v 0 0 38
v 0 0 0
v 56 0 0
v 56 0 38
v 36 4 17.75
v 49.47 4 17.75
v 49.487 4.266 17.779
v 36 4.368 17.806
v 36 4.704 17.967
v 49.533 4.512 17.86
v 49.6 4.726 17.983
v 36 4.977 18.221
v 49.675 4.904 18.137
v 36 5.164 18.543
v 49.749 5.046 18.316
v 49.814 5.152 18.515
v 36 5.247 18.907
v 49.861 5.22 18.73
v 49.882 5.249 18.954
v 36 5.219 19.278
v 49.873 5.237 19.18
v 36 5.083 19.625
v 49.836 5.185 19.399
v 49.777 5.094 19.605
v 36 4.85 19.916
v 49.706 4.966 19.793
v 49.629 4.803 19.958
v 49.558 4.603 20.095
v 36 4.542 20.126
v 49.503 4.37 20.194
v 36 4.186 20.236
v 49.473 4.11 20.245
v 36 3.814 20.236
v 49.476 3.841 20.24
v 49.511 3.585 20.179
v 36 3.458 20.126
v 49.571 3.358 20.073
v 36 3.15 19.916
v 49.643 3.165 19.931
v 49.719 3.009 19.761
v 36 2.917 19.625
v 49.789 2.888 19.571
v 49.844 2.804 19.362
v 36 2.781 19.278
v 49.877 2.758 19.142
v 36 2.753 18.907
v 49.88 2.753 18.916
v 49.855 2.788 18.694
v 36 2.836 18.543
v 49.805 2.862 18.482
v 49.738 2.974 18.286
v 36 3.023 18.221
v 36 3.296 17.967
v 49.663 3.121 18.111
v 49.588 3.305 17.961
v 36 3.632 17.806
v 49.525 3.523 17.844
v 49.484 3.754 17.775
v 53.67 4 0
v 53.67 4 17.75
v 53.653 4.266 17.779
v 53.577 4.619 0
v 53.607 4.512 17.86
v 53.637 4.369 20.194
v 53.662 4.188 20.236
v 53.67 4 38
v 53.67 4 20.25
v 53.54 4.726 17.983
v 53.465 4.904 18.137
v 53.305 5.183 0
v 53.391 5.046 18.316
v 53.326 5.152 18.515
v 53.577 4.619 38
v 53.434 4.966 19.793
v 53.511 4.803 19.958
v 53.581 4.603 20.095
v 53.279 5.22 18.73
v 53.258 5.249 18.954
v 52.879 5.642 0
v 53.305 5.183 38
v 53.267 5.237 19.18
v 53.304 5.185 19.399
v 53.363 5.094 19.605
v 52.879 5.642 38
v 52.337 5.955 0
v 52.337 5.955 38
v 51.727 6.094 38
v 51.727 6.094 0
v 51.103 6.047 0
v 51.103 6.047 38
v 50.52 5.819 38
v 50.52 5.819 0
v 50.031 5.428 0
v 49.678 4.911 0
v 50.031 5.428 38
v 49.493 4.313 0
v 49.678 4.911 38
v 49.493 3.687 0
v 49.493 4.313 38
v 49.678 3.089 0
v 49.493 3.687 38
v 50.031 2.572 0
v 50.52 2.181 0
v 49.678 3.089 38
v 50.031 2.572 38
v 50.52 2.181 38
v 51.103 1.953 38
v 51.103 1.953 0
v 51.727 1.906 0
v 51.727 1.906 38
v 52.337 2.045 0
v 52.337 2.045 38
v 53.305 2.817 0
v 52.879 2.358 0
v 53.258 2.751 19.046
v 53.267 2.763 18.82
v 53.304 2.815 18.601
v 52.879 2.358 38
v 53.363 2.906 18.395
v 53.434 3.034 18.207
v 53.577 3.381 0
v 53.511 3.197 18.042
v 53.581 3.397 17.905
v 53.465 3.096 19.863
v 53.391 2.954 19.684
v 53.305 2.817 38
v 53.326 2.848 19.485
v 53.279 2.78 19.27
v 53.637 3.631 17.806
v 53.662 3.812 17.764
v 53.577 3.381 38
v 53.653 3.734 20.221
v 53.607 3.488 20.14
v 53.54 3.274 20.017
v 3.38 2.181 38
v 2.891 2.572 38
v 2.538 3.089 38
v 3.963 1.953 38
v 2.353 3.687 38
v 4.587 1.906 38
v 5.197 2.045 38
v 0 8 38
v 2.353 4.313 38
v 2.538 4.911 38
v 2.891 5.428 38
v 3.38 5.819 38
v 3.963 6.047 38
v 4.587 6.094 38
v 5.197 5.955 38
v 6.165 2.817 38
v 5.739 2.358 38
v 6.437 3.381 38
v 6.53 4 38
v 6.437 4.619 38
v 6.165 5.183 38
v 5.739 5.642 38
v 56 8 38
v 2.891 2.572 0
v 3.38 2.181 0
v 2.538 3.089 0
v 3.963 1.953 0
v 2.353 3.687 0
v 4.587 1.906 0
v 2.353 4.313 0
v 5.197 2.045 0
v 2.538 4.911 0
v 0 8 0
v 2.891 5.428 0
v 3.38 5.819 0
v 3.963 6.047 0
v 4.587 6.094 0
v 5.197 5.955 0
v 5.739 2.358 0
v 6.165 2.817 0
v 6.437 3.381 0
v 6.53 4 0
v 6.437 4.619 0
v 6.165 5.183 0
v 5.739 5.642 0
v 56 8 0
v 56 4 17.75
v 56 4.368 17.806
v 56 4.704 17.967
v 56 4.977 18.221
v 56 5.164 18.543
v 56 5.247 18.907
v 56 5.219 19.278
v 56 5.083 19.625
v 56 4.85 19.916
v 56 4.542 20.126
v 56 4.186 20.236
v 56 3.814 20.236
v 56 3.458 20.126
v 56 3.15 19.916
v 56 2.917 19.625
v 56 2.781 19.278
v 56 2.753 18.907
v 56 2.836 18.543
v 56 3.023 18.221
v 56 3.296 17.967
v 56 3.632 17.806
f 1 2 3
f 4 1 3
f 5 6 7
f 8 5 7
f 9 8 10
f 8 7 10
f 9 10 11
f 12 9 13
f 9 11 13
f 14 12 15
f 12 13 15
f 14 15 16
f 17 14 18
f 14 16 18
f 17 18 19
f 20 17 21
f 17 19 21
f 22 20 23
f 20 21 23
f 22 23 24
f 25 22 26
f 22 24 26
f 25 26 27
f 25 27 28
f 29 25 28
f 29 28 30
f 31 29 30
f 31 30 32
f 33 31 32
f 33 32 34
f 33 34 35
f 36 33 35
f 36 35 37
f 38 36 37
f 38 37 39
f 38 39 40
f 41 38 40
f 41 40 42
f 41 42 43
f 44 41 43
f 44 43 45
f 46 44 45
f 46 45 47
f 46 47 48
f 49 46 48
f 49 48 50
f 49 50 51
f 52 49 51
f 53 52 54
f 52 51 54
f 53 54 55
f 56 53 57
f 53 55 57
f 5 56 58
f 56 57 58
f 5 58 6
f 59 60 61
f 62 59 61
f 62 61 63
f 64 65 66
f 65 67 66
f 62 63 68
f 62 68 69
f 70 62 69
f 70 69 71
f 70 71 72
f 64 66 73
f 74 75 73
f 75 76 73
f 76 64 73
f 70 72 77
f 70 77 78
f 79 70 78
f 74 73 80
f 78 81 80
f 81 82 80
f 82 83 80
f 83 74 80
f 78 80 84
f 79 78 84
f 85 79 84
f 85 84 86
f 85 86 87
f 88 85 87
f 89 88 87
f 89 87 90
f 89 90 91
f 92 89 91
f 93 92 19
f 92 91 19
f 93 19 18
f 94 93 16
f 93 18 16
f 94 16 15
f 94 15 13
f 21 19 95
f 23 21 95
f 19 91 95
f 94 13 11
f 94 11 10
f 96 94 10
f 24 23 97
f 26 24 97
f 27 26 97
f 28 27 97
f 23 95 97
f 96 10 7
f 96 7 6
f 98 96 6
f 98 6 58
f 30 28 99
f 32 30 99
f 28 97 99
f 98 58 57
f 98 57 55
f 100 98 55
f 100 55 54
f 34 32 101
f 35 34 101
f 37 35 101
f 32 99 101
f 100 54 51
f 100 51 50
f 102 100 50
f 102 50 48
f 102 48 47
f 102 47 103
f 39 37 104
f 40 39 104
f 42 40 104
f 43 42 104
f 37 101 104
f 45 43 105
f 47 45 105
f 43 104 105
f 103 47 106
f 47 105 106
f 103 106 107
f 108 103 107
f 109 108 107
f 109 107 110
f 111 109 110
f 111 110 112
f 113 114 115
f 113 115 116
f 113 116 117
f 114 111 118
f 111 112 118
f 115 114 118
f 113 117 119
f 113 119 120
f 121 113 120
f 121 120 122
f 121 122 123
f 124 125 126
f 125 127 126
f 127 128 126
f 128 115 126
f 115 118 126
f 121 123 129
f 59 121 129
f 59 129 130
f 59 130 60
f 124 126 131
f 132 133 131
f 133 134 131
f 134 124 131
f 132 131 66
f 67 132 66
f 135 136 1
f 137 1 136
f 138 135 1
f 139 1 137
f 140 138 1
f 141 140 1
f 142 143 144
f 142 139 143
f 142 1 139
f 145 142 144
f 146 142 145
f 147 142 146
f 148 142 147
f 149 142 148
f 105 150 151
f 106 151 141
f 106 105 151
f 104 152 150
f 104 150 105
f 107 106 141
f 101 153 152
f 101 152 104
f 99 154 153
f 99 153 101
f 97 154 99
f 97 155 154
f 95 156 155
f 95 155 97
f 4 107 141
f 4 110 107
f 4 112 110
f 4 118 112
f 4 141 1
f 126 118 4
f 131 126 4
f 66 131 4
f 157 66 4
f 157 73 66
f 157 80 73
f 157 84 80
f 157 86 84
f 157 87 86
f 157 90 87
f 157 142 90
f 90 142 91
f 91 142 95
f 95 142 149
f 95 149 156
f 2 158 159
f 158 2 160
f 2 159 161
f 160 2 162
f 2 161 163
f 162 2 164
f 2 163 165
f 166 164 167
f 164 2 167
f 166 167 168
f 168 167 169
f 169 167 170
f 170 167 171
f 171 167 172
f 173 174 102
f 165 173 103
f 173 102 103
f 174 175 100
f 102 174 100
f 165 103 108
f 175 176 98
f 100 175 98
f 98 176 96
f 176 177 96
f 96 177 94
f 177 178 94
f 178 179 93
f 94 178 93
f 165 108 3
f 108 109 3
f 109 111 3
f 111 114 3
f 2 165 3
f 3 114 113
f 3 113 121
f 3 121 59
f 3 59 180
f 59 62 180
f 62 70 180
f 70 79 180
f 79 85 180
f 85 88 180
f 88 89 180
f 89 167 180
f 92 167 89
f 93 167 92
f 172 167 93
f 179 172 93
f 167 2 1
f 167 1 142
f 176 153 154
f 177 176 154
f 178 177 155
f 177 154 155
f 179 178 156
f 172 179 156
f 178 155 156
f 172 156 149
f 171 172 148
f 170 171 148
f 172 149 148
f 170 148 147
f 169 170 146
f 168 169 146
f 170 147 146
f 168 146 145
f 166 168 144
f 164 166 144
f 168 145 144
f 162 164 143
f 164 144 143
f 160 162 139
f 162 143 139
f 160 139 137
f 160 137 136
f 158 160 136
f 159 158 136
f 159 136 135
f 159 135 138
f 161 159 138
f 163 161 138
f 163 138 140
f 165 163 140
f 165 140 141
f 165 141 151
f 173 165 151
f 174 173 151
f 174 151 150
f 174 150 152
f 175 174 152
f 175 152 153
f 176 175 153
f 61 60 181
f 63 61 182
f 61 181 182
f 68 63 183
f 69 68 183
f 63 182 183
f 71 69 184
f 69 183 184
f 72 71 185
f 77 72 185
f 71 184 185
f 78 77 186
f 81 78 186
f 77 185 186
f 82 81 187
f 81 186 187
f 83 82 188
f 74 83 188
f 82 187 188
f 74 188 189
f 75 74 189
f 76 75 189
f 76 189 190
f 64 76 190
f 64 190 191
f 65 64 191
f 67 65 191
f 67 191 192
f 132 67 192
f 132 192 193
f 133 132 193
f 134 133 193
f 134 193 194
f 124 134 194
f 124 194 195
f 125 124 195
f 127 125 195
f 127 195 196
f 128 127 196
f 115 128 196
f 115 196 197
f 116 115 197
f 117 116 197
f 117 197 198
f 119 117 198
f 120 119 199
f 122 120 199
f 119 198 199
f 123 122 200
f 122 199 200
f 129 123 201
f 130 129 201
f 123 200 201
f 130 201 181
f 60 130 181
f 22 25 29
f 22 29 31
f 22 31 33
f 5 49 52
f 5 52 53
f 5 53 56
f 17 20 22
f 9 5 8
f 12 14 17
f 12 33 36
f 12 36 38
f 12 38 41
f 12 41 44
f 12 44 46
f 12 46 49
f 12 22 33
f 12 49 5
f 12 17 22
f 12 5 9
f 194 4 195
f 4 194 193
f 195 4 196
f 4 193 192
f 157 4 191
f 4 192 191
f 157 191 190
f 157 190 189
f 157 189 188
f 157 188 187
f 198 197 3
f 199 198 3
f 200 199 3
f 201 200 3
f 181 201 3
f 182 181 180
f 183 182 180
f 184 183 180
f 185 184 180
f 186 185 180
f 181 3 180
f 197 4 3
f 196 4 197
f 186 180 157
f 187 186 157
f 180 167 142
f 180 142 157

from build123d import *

# Parameters (mm, degrees)
SKETCH_1_W          = 56
SKETCH_1_H          = 8
EXTRUDE_1_DEPTH     = 38
SKETCH_2_R          = 2.1
CUT_EXTRUDE_1_DEPTH = 69.14690015
SKETCH_3_R          = 1.25
CUT_EXTRUDE_2_DEPTH = 20


with BuildPart() as part:
    # Эскиз1 → Бобышка-Вытянуть1 (new body)
    with BuildSketch(Plane.XY):
        with Locations((28, 4)):
            Rectangle(SKETCH_1_W, SKETCH_1_H)
    extrude(amount=EXTRUDE_1_DEPTH)

    # Эскиз2 → Вырез-Вытянуть1 (cut, through all)
    with BuildSketch(Plane.XY.offset(38)):
        with Locations((4.43, 4)):
            Circle(SKETCH_2_R)
        with Locations((51.57, 4)):
            Circle(SKETCH_2_R)
    extrude(amount=-CUT_EXTRUDE_1_DEPTH, mode=Mode.SUBTRACT)

    # Эскиз3 → Вырез-Вытянуть2 (cut)
    with BuildSketch(Plane(origin=(56, 0, 0), x_dir=(0, 0, -1), z_dir=(1, 0, 0))):
        with Locations((-19, 4)):
            Circle(SKETCH_3_R)
    extrude(amount=-CUT_EXTRUDE_2_DEPTH, mode=Mode.SUBTRACT)


solid = part.part
